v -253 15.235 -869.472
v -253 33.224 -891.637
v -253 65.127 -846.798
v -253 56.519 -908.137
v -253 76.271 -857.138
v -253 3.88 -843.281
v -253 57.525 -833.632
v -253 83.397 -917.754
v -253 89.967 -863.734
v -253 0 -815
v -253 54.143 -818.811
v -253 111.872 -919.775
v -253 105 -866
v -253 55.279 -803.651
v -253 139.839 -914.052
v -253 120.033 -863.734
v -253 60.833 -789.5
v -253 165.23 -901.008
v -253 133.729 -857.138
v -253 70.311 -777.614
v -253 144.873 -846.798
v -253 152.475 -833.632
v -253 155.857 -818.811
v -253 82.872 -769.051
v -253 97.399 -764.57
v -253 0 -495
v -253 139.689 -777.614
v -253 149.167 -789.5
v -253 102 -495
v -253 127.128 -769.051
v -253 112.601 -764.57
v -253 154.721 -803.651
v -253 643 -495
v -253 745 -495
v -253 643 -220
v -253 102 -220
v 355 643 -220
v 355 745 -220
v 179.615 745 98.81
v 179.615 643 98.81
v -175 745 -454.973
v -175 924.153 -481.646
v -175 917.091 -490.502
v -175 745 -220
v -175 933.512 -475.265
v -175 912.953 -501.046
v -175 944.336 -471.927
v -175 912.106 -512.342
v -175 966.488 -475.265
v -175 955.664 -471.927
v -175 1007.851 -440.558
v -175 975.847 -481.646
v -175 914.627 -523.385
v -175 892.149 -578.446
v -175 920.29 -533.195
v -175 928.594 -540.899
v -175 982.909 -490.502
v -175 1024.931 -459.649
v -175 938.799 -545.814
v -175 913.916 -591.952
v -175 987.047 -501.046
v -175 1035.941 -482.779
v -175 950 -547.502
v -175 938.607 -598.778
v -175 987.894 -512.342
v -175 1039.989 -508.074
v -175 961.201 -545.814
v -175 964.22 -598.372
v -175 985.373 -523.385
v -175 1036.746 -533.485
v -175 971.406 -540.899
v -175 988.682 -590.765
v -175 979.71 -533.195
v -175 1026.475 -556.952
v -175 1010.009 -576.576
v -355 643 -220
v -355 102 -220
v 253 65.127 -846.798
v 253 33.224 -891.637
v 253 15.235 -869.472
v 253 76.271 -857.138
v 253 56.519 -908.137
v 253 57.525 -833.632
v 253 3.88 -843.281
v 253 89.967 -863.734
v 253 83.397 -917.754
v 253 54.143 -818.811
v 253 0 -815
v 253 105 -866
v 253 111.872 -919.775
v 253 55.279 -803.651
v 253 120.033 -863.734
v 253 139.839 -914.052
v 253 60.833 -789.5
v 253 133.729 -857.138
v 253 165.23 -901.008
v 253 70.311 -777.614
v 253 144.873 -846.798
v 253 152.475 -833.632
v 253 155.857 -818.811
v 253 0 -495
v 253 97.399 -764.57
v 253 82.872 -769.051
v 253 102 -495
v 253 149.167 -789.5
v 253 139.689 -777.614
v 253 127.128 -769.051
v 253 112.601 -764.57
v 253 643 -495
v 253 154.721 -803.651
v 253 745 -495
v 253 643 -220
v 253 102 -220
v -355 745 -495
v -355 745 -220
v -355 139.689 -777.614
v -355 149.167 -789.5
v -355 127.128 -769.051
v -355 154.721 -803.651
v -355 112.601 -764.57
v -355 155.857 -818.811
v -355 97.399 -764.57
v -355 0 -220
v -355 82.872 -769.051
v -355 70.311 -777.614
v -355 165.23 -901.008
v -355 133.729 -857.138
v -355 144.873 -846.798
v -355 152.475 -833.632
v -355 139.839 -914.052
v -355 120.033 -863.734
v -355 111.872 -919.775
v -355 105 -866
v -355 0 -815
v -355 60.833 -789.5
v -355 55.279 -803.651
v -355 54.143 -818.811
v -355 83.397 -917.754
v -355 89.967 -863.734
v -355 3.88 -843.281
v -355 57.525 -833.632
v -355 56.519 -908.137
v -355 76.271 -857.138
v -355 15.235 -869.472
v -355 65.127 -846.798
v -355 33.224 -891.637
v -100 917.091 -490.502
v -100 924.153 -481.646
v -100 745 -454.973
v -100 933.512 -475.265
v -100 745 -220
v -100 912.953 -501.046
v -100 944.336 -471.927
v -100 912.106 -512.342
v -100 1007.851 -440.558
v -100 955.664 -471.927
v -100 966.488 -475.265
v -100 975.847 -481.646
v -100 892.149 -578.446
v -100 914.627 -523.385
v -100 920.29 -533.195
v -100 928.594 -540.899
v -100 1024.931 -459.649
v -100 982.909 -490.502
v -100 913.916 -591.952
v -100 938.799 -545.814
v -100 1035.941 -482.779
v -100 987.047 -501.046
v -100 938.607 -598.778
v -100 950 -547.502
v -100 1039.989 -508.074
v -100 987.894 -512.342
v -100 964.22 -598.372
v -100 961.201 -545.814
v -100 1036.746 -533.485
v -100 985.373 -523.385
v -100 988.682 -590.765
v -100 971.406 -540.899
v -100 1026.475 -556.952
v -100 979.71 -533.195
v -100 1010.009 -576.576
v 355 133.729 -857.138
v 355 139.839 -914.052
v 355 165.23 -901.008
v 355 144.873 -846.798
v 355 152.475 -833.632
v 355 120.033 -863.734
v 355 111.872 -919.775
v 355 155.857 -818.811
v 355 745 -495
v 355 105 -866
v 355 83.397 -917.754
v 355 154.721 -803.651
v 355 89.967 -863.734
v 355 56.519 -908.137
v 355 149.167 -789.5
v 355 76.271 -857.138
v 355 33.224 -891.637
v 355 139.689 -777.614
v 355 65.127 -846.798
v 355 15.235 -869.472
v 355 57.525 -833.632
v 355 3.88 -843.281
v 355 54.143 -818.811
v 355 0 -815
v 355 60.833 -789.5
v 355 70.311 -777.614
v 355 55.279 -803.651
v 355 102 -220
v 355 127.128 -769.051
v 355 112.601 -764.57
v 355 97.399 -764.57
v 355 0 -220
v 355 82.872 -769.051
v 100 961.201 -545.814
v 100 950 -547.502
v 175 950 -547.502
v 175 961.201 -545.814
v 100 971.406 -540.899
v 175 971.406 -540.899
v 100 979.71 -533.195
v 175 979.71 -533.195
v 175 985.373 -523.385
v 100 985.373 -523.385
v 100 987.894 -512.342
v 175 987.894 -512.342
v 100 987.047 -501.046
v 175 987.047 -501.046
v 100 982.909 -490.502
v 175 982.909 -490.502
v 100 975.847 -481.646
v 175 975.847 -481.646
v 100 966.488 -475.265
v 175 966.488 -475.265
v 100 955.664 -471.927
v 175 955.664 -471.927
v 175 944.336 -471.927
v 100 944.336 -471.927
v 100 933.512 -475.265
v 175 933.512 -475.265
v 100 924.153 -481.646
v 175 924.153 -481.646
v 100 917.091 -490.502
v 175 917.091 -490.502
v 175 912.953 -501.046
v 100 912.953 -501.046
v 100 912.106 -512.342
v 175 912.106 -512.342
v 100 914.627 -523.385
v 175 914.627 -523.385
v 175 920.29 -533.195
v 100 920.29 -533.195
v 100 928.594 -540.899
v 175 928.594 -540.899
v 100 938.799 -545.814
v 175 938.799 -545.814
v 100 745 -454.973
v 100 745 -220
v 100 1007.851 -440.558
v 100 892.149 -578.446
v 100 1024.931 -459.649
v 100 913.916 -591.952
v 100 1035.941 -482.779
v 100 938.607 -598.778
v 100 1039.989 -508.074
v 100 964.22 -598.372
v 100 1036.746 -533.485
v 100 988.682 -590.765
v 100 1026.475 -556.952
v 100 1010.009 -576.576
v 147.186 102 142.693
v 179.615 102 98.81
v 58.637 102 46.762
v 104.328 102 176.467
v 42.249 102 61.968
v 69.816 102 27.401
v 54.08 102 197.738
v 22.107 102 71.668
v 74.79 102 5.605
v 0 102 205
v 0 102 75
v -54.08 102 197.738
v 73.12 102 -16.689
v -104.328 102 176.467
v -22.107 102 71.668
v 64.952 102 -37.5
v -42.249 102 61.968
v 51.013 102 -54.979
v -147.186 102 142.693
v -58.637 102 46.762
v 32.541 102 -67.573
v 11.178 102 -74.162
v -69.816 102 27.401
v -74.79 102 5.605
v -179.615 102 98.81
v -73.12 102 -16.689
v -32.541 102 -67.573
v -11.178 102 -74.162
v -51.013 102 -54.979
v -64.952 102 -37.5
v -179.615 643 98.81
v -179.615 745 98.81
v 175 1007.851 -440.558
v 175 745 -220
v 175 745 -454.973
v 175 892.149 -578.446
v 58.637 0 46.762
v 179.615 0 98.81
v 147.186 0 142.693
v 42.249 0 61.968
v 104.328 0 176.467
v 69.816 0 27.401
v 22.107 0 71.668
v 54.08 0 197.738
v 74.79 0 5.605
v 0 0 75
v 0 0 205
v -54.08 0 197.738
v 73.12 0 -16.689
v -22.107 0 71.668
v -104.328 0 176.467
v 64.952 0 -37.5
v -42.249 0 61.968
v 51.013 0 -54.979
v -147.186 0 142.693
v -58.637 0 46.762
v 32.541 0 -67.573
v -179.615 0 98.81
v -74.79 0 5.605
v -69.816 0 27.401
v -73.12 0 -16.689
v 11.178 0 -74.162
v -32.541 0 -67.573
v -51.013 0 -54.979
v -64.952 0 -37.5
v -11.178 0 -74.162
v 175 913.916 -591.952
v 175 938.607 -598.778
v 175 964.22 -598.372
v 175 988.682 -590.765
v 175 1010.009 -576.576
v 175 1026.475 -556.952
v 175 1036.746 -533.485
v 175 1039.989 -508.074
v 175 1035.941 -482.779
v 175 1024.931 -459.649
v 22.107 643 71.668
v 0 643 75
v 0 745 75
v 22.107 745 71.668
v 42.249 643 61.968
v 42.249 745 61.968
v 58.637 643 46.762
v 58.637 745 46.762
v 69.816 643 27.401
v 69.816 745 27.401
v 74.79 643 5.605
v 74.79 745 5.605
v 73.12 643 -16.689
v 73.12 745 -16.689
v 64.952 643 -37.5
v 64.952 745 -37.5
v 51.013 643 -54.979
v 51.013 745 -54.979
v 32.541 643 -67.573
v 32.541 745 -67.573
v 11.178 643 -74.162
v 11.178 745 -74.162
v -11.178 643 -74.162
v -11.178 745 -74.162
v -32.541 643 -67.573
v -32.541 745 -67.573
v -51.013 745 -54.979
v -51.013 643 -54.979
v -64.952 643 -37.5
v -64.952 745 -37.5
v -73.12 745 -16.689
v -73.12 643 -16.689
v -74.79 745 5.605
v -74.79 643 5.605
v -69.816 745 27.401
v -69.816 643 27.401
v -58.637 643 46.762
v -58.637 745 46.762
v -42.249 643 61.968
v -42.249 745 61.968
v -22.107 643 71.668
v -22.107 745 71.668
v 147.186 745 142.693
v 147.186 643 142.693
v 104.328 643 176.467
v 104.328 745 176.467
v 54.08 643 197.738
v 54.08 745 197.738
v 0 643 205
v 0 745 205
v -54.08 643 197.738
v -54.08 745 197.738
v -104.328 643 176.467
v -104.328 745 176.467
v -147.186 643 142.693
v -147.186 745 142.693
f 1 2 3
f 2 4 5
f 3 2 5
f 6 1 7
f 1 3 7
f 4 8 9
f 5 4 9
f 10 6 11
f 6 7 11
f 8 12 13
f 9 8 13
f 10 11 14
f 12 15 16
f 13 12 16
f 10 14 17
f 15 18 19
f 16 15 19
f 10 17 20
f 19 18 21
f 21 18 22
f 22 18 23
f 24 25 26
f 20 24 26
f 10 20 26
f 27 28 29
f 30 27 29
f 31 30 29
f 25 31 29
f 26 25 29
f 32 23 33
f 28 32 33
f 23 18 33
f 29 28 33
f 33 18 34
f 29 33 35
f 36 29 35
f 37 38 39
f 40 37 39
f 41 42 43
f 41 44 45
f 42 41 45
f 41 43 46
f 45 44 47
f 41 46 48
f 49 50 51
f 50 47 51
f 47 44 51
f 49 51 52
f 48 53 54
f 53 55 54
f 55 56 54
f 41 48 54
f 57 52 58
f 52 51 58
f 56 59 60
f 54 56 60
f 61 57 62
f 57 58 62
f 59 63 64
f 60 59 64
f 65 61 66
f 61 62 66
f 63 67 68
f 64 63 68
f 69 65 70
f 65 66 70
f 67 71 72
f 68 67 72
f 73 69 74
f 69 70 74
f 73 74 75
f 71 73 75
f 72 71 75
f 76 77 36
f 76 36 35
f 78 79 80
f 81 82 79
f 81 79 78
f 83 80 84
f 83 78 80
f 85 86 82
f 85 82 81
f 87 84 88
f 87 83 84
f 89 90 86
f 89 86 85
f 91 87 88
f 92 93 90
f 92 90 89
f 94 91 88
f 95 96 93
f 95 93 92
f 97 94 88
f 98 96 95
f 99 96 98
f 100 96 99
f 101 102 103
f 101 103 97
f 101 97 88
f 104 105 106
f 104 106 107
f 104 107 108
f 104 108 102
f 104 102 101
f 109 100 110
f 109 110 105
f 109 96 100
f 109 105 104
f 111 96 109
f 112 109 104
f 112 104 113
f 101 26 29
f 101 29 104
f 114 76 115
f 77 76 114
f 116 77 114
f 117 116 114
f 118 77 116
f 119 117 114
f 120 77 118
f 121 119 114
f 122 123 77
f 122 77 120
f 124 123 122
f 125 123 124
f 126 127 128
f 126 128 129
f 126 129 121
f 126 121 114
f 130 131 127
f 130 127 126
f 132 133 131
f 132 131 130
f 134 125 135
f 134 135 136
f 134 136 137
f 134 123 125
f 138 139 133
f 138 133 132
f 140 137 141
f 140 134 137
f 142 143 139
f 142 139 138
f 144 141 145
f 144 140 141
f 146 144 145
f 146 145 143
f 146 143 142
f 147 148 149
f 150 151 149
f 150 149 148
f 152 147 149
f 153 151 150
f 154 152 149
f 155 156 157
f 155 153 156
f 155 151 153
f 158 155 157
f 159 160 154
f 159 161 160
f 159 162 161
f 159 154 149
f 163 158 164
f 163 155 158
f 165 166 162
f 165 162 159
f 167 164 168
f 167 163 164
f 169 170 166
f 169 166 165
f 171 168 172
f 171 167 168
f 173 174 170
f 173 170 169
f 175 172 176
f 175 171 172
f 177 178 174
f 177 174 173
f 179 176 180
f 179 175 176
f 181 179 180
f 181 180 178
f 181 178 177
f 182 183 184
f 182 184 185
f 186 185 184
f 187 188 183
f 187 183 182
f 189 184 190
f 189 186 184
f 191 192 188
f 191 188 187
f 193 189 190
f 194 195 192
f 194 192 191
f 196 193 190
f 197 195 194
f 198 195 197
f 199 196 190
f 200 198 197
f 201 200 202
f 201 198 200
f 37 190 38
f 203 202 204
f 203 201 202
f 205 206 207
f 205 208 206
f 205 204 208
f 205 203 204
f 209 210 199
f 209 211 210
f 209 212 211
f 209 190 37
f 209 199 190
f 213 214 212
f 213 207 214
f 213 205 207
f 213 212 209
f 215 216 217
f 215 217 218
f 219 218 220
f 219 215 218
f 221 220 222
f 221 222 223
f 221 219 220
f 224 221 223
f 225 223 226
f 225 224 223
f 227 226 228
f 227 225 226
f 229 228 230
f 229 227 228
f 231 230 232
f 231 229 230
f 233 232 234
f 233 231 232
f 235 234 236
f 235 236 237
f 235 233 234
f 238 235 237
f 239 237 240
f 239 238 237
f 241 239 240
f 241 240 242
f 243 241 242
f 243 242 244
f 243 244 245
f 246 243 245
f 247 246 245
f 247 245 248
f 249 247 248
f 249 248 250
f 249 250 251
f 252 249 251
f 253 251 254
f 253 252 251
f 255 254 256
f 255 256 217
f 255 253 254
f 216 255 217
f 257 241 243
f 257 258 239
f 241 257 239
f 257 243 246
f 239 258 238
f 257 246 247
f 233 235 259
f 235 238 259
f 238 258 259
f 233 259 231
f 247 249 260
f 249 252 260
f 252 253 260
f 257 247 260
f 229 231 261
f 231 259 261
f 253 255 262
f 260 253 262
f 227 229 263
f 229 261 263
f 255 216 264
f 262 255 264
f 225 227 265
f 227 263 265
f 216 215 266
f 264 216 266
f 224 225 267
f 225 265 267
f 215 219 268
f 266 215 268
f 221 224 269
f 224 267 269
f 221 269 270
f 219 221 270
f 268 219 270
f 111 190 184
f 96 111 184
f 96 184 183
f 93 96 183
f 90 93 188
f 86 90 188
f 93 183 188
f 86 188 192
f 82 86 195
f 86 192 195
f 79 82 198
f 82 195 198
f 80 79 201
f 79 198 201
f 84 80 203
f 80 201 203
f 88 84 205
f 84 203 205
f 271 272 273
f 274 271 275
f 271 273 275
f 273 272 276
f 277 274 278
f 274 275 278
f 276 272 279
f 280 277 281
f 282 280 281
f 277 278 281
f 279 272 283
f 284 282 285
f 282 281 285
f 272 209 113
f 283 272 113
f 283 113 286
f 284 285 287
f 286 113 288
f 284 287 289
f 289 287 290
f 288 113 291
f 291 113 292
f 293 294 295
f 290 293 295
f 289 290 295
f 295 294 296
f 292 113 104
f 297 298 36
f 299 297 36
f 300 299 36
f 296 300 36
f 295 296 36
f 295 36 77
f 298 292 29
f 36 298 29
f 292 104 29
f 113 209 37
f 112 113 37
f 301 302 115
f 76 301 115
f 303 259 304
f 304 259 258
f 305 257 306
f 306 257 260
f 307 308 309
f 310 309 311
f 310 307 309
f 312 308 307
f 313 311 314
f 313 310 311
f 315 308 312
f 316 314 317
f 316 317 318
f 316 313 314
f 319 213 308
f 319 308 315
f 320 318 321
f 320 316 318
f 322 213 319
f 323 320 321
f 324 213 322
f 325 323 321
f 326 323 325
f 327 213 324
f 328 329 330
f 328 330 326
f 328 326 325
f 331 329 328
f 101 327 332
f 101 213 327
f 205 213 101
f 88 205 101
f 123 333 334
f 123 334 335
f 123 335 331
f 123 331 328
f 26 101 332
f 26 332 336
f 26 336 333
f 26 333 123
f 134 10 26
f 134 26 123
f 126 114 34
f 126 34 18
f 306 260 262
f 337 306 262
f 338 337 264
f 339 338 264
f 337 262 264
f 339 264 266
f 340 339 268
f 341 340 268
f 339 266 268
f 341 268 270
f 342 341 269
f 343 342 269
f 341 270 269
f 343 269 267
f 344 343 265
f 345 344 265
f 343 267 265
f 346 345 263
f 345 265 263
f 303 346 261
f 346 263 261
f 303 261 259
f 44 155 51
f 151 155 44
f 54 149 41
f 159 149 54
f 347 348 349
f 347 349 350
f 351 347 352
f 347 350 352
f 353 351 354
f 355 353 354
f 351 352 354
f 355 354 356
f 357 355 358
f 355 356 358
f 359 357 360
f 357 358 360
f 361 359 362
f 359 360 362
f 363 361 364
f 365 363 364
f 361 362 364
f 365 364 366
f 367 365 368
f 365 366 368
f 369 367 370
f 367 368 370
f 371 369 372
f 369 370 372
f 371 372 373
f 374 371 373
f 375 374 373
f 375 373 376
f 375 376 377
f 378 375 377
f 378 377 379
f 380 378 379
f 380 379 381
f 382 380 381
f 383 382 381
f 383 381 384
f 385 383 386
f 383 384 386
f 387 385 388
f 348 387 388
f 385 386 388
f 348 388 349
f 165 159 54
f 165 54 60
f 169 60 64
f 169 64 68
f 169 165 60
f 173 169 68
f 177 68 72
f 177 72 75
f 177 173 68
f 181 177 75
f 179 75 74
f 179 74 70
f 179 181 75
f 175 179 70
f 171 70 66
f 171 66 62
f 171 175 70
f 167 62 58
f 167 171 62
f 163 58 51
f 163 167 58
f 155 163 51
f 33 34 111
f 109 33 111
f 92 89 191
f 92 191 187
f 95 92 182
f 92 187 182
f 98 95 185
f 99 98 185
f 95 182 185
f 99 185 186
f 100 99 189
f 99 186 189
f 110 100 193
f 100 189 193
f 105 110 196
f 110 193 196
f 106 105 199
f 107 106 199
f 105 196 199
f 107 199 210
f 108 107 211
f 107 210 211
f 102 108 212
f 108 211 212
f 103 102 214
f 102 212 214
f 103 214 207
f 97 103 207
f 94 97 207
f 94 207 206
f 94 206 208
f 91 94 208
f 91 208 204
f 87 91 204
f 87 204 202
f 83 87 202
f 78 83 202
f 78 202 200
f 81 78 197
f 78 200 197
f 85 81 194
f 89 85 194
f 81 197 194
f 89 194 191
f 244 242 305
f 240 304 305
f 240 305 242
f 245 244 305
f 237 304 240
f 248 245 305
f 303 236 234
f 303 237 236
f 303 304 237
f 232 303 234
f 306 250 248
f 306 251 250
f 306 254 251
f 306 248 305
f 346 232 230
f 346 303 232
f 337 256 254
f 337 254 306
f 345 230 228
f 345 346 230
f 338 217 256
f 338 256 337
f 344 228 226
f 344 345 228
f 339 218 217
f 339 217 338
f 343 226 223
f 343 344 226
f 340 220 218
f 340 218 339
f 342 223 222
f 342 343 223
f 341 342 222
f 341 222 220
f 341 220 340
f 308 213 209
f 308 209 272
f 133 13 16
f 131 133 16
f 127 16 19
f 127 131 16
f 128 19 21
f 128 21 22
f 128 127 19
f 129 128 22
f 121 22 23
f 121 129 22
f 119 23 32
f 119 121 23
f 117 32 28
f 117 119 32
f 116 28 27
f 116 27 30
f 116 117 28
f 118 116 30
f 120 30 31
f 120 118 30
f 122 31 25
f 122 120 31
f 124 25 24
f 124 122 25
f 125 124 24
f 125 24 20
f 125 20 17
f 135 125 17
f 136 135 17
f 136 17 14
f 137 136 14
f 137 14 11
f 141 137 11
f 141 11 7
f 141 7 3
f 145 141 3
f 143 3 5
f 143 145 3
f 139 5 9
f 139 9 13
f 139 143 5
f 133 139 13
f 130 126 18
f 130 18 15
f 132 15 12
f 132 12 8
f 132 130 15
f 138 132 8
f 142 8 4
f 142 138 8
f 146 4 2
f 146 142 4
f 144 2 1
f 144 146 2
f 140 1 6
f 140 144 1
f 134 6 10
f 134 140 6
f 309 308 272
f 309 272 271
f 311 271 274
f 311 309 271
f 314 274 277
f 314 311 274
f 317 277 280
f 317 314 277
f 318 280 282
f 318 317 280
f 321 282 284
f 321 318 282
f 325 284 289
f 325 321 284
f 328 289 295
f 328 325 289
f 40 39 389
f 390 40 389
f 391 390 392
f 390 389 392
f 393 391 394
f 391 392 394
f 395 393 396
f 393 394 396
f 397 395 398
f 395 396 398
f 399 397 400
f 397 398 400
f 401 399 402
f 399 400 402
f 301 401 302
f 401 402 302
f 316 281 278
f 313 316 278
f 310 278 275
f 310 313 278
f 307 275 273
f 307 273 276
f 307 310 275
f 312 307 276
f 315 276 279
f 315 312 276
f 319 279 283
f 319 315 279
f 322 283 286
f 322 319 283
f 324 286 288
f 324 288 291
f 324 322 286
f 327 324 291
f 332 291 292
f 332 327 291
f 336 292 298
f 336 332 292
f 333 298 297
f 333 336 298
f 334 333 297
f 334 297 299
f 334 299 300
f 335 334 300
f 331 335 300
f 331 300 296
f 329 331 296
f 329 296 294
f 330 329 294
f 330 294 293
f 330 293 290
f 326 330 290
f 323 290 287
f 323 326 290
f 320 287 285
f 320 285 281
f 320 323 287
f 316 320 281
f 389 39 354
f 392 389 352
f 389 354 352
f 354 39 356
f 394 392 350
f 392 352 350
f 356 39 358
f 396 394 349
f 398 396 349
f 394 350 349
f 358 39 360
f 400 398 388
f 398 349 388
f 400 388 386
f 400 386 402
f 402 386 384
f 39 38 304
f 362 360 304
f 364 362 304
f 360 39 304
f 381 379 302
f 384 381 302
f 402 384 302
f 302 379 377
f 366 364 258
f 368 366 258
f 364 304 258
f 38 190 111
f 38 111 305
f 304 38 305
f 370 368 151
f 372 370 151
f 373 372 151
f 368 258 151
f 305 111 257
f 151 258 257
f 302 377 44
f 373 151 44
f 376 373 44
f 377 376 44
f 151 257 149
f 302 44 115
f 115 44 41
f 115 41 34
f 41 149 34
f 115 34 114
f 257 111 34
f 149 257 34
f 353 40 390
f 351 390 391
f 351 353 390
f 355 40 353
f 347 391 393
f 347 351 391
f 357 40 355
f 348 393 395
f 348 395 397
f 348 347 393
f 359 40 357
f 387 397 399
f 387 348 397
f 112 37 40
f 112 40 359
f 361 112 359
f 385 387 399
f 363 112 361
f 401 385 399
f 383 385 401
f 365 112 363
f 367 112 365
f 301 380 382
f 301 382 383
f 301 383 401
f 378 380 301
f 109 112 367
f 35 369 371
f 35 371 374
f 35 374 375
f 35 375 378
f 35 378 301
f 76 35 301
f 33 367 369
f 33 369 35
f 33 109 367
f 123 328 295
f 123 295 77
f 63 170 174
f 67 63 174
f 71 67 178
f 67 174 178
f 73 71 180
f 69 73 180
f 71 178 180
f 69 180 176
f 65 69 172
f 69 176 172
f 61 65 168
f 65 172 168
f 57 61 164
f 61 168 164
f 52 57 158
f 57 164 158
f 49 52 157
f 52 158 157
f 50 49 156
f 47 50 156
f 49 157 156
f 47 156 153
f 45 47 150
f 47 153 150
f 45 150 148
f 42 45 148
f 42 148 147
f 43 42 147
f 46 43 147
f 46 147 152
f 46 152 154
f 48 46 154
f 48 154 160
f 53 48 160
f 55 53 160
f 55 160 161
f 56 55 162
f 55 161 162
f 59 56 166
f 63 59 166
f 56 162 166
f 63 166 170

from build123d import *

# Parameters (mm, degrees)
SKETCH1_R           = 75
BOSS_EXTRUDE1_DEPTH = 102
SKETCH3_R           = 51
BOSS_EXTRUDE2_DEPTH = 102
SKETCH4_R           = 38
BOSS_EXTRUDE3_DEPTH = 75


with BuildPart() as part:
    # Sketch1 → Boss-Extrude1 (new body)
    with BuildSketch(Plane(origin=(0, 0, 0), x_dir=(1, 0, 0), z_dir=(0, 1, 0))):
        with BuildLine():
            Line((-179.614887026, -98.810385884), (-355, 220))
            Line((-355, 220), (-355, 495))
            Line((-355, 495), (355, 495))
            Line((355, 495), (355, 220))
            Line((355, 220), (179.614887026, -98.810385884))
            ThreePointArc((179.614887026, -98.810385884), (0, -205), (-179.614887026, -98.810385884))
        make_face()
        with Locations(Location((0, 0, 0), (0, 0, 270))):
            Circle(SKETCH1_R, mode=Mode.SUBTRACT)
    boss_extrude1 = extrude(amount=BOSS_EXTRUDE1_DEPTH)

    # Sketch3 → Boss-Extrude2 (add)
    with BuildSketch(Plane(origin=(355, 0, 0), x_dir=(0, 0, -1), z_dir=(1, 0, 0))):
        with BuildLine():
            Line((220, 0), (220, 745))
            Line((220, 745), (495, 745))
            Line((495, 745), (901.007583532, 165.230354266))
            ThreePointArc((901.007583532, 165.230354266), (908.13749835, 56.5190099), (815, 0))
            Line((815, 0), (220, 0))
        make_face()
        with Locations((815, 105)):
            Circle(SKETCH3_R, mode=Mode.SUBTRACT)
    boss_extrude2 = extrude(amount=-BOSS_EXTRUDE2_DEPTH)

    # Mirror1: Boss-Extrude2 across plane
    add(boss_extrude2.mirror(Plane(origin=(0, 0, 0), x_dir=(0, 0, 1), z_dir=(1, 0, 0))))

    # Mirror2: Boss-Extrude1 across plane
    add(boss_extrude1.mirror(Plane(origin=(0, 372.5, 0), x_dir=(0, 0, 1), z_dir=(0, -1, 0))))

    # Sketch4 → Boss-Extrude3 (add)
    with BuildSketch(Plane(origin=(100, 0, 0), x_dir=(0, 0, -1), z_dir=(1, 0, 0))):
        with BuildLine():
            Line((440.558080551, 1007.850884872), (220, 745))
            Line((220, 745), (454.97331208, 745))
            Line((454.97331208, 745), (578.446080312, 892.149115128))
            ThreePointArc((578.446080312, 892.149115128), (567.352965303, 1018.943999881), (440.558080551, 1007.850884872))
        make_face()
        with Locations((509.502080431, 950)):
            Circle(SKETCH4_R, mode=Mode.SUBTRACT)
    boss_extrude3 = extrude(amount=BOSS_EXTRUDE3_DEPTH)

    # Mirror3: Boss-Extrude3 across plane
    add(boss_extrude3.mirror(Plane(origin=(0, 0, 0), x_dir=(0, 0, 1), z_dir=(1, 0, 0))))


solid = part.part
